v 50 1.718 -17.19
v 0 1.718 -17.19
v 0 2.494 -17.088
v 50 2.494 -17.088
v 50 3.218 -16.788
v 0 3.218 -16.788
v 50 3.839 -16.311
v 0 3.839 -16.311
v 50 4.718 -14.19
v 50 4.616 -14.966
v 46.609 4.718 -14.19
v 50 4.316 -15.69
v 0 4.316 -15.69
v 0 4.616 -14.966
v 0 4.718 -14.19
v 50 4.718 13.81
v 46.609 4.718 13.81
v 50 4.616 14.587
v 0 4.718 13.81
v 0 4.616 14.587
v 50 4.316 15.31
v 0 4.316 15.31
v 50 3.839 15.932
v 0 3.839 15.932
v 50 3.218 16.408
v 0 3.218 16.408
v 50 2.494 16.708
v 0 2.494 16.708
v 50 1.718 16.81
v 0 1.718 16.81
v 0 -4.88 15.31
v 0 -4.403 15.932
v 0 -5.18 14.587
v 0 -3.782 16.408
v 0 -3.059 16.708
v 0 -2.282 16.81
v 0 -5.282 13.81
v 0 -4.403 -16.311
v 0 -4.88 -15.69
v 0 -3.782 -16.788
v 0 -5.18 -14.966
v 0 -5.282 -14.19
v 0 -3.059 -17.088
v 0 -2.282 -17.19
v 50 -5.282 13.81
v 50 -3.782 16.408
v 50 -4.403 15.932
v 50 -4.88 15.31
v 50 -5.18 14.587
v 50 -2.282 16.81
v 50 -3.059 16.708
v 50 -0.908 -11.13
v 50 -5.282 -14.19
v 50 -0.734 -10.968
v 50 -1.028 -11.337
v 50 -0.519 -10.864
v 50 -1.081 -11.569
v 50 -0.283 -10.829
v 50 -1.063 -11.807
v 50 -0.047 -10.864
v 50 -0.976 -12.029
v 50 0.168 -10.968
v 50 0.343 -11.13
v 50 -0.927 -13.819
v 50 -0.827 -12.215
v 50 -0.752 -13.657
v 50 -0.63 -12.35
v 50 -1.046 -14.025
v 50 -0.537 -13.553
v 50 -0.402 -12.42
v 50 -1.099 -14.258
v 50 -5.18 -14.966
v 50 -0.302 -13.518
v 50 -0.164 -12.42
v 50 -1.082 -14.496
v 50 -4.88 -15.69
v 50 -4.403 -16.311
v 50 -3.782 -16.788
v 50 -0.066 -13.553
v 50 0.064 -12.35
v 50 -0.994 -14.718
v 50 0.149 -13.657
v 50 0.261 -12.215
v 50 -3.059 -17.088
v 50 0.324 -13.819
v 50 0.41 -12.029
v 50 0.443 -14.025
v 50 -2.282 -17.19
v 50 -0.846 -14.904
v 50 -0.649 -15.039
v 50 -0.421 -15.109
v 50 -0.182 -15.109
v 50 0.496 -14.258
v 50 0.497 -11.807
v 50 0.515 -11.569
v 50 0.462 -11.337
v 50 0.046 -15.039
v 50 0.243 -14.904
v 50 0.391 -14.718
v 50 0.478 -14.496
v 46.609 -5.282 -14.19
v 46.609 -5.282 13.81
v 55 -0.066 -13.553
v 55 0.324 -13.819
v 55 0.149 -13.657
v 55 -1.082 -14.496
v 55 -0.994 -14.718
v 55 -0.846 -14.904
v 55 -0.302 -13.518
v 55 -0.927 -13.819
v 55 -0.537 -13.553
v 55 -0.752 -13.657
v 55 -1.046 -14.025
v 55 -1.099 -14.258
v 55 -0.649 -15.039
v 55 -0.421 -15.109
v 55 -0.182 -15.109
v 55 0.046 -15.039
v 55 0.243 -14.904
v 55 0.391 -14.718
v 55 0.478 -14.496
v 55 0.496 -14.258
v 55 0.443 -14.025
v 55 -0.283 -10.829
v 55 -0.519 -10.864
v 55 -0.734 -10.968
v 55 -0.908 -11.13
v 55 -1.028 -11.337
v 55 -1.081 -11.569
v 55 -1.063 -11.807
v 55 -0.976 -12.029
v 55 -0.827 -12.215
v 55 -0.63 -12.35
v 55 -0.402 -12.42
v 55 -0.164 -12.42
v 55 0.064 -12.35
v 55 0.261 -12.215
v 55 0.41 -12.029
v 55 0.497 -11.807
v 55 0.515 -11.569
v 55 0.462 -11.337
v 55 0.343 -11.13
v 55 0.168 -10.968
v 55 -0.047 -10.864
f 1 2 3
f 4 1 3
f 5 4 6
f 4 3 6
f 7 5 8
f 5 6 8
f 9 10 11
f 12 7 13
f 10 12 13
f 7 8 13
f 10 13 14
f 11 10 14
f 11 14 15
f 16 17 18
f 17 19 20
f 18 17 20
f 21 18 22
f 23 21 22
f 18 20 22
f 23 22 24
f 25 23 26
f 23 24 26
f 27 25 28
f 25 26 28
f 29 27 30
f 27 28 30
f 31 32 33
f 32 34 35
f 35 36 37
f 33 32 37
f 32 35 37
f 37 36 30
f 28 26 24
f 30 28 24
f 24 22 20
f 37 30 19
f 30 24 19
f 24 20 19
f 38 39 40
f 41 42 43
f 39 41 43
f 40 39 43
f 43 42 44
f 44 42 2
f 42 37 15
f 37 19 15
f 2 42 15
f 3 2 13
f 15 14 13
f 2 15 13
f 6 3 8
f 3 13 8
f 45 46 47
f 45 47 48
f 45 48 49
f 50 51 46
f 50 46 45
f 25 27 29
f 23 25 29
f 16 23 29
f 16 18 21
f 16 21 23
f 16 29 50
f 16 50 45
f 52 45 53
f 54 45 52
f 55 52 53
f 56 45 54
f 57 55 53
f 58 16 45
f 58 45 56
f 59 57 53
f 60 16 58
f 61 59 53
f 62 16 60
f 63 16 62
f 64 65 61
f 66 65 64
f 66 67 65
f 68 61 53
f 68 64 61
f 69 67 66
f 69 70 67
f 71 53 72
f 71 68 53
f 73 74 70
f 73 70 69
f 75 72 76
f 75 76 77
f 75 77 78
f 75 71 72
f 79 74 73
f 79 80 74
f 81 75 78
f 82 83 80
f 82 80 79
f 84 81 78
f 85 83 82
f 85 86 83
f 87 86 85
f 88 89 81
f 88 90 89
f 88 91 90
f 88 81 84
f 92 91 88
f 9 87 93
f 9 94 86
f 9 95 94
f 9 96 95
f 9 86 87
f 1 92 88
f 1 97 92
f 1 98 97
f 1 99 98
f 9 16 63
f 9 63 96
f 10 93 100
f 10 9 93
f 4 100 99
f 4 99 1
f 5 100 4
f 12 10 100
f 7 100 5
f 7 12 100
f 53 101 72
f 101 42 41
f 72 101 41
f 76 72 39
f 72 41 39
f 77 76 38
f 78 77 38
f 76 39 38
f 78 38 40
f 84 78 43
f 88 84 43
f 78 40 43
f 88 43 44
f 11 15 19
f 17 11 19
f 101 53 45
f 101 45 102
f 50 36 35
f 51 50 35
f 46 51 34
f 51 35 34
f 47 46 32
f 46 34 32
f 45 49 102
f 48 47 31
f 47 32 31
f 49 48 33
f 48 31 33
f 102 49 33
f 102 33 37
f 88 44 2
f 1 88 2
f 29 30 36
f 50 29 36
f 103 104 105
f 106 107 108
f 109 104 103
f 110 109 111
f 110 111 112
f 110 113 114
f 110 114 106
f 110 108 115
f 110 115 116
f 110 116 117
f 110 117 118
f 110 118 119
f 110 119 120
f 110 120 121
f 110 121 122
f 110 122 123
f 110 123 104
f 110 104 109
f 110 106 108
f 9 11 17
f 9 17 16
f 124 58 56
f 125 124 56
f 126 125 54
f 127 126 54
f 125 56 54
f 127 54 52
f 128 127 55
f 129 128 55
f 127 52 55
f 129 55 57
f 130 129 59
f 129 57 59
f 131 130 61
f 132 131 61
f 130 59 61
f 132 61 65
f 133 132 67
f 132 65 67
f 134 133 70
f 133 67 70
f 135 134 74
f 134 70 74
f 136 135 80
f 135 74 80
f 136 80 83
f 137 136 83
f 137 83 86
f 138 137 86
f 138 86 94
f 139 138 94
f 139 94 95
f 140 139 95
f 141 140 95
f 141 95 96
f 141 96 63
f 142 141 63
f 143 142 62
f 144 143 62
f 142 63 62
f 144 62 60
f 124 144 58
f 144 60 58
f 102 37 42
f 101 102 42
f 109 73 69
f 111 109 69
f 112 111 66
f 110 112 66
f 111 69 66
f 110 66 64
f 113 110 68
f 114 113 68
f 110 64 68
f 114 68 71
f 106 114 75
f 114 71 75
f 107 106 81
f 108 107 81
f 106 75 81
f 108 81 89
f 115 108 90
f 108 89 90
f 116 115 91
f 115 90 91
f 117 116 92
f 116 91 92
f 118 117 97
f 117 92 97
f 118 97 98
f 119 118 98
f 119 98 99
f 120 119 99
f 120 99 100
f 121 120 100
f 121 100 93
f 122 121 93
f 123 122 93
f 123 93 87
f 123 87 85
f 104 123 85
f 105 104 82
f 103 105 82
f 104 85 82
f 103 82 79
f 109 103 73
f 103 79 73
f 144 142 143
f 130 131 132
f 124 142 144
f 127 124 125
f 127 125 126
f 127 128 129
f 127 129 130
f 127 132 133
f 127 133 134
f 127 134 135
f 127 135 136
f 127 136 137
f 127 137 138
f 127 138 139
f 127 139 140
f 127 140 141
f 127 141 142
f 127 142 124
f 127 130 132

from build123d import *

# Parameters (mm, degrees)
EXTRUDE_2_DEPTH = 50
SKETCH_5_R      = 0.8
EXTRUDE_4_DEPTH = 5
SKETCH_6_R      = 0.8
EXTRUDE_5_DEPTH = 5
SKETCH_7_W      = 3.391372173
SKETCH_7_H      = 28
EXTRUDE_6_DEPTH = 0.0001
SKETCH_8_W      = 3.391372173
SKETCH_8_H      = 28
EXTRUDE_7_DEPTH = 0.0001


with BuildPart() as part:
    # 草图1 → 凸台-拉伸2 (new body)
    with BuildSketch(Plane(origin=(0, 0, 0), x_dir=(0, 0, -1), z_dir=(1, 0, 0))):
        with BuildLine():
            Line((-13.81021057, -5.282067654), (14.18978943, -5.282067654))
            ThreePointArc((14.18978943, -5.282067654), (16.311109773, -4.403387998), (17.18978943, -2.282067654))
            Line((17.18978943, -2.282067654), (17.18978943, 1.717932346))
            ThreePointArc((17.18978943, 1.717932346), (16.311109773, 3.839252689), (14.18978943, 4.717932346))
            Line((14.18978943, 4.717932346), (-13.81021057, 4.717932346))
            ThreePointArc((-13.81021057, 4.717932346), (-15.931530914, 3.839252689), (-16.81021057, 1.717932346))
            Line((-16.81021057, 1.717932346), (-16.81021057, -2.282067654))
            ThreePointArc((-16.81021057, -2.282067654), (-15.931530914, -4.403387998), (-13.81021057, -5.282067654))
        make_face()
    extrude(amount=EXTRUDE_2_DEPTH)

    # 草图5 → 凸台-拉伸4 (add)
    with BuildSketch(Plane(origin=(50, 0, 0), x_dir=(0, 0, -1), z_dir=(1, 0, 0))):
        with Locations(Location((11.628905856, -0.282922759, 0), (0, 0, 180))):
            Circle(SKETCH_5_R)
    extrude(amount=EXTRUDE_4_DEPTH)

    # 草图6 → 凸台-拉伸5 (add)
    with BuildSketch(Plane(origin=(50, 0, 0), x_dir=(0, 0, -1), z_dir=(1, 0, 0))):
        with Locations(Location((14.317760306, -0.301594573, 0), (0, 0, 180))):
            Circle(SKETCH_6_R)
    extrude(amount=EXTRUDE_5_DEPTH)

    # 草图7 → 凸台-拉伸6 (add)
    with BuildSketch(Plane(origin=(0, 4.717932346, 0), x_dir=(1, 0, 0), z_dir=(0, 1, 0))):
        with Locations((48.304313913, 0.18978943)):
            Rectangle(SKETCH_7_W, SKETCH_7_H)
    extrude(amount=EXTRUDE_6_DEPTH)

    # 草图8 → 凸台-拉伸7 (add)
    with BuildSketch(Plane(origin=(0, -5.282067654, 0), x_dir=(-1, 0, 0), z_dir=(0, -1, 0))):
        with Locations((-48.304313913, 0.18978943)):
            Rectangle(SKETCH_8_W, SKETCH_8_H)
    extrude(amount=EXTRUDE_7_DEPTH)


solid = part.part
